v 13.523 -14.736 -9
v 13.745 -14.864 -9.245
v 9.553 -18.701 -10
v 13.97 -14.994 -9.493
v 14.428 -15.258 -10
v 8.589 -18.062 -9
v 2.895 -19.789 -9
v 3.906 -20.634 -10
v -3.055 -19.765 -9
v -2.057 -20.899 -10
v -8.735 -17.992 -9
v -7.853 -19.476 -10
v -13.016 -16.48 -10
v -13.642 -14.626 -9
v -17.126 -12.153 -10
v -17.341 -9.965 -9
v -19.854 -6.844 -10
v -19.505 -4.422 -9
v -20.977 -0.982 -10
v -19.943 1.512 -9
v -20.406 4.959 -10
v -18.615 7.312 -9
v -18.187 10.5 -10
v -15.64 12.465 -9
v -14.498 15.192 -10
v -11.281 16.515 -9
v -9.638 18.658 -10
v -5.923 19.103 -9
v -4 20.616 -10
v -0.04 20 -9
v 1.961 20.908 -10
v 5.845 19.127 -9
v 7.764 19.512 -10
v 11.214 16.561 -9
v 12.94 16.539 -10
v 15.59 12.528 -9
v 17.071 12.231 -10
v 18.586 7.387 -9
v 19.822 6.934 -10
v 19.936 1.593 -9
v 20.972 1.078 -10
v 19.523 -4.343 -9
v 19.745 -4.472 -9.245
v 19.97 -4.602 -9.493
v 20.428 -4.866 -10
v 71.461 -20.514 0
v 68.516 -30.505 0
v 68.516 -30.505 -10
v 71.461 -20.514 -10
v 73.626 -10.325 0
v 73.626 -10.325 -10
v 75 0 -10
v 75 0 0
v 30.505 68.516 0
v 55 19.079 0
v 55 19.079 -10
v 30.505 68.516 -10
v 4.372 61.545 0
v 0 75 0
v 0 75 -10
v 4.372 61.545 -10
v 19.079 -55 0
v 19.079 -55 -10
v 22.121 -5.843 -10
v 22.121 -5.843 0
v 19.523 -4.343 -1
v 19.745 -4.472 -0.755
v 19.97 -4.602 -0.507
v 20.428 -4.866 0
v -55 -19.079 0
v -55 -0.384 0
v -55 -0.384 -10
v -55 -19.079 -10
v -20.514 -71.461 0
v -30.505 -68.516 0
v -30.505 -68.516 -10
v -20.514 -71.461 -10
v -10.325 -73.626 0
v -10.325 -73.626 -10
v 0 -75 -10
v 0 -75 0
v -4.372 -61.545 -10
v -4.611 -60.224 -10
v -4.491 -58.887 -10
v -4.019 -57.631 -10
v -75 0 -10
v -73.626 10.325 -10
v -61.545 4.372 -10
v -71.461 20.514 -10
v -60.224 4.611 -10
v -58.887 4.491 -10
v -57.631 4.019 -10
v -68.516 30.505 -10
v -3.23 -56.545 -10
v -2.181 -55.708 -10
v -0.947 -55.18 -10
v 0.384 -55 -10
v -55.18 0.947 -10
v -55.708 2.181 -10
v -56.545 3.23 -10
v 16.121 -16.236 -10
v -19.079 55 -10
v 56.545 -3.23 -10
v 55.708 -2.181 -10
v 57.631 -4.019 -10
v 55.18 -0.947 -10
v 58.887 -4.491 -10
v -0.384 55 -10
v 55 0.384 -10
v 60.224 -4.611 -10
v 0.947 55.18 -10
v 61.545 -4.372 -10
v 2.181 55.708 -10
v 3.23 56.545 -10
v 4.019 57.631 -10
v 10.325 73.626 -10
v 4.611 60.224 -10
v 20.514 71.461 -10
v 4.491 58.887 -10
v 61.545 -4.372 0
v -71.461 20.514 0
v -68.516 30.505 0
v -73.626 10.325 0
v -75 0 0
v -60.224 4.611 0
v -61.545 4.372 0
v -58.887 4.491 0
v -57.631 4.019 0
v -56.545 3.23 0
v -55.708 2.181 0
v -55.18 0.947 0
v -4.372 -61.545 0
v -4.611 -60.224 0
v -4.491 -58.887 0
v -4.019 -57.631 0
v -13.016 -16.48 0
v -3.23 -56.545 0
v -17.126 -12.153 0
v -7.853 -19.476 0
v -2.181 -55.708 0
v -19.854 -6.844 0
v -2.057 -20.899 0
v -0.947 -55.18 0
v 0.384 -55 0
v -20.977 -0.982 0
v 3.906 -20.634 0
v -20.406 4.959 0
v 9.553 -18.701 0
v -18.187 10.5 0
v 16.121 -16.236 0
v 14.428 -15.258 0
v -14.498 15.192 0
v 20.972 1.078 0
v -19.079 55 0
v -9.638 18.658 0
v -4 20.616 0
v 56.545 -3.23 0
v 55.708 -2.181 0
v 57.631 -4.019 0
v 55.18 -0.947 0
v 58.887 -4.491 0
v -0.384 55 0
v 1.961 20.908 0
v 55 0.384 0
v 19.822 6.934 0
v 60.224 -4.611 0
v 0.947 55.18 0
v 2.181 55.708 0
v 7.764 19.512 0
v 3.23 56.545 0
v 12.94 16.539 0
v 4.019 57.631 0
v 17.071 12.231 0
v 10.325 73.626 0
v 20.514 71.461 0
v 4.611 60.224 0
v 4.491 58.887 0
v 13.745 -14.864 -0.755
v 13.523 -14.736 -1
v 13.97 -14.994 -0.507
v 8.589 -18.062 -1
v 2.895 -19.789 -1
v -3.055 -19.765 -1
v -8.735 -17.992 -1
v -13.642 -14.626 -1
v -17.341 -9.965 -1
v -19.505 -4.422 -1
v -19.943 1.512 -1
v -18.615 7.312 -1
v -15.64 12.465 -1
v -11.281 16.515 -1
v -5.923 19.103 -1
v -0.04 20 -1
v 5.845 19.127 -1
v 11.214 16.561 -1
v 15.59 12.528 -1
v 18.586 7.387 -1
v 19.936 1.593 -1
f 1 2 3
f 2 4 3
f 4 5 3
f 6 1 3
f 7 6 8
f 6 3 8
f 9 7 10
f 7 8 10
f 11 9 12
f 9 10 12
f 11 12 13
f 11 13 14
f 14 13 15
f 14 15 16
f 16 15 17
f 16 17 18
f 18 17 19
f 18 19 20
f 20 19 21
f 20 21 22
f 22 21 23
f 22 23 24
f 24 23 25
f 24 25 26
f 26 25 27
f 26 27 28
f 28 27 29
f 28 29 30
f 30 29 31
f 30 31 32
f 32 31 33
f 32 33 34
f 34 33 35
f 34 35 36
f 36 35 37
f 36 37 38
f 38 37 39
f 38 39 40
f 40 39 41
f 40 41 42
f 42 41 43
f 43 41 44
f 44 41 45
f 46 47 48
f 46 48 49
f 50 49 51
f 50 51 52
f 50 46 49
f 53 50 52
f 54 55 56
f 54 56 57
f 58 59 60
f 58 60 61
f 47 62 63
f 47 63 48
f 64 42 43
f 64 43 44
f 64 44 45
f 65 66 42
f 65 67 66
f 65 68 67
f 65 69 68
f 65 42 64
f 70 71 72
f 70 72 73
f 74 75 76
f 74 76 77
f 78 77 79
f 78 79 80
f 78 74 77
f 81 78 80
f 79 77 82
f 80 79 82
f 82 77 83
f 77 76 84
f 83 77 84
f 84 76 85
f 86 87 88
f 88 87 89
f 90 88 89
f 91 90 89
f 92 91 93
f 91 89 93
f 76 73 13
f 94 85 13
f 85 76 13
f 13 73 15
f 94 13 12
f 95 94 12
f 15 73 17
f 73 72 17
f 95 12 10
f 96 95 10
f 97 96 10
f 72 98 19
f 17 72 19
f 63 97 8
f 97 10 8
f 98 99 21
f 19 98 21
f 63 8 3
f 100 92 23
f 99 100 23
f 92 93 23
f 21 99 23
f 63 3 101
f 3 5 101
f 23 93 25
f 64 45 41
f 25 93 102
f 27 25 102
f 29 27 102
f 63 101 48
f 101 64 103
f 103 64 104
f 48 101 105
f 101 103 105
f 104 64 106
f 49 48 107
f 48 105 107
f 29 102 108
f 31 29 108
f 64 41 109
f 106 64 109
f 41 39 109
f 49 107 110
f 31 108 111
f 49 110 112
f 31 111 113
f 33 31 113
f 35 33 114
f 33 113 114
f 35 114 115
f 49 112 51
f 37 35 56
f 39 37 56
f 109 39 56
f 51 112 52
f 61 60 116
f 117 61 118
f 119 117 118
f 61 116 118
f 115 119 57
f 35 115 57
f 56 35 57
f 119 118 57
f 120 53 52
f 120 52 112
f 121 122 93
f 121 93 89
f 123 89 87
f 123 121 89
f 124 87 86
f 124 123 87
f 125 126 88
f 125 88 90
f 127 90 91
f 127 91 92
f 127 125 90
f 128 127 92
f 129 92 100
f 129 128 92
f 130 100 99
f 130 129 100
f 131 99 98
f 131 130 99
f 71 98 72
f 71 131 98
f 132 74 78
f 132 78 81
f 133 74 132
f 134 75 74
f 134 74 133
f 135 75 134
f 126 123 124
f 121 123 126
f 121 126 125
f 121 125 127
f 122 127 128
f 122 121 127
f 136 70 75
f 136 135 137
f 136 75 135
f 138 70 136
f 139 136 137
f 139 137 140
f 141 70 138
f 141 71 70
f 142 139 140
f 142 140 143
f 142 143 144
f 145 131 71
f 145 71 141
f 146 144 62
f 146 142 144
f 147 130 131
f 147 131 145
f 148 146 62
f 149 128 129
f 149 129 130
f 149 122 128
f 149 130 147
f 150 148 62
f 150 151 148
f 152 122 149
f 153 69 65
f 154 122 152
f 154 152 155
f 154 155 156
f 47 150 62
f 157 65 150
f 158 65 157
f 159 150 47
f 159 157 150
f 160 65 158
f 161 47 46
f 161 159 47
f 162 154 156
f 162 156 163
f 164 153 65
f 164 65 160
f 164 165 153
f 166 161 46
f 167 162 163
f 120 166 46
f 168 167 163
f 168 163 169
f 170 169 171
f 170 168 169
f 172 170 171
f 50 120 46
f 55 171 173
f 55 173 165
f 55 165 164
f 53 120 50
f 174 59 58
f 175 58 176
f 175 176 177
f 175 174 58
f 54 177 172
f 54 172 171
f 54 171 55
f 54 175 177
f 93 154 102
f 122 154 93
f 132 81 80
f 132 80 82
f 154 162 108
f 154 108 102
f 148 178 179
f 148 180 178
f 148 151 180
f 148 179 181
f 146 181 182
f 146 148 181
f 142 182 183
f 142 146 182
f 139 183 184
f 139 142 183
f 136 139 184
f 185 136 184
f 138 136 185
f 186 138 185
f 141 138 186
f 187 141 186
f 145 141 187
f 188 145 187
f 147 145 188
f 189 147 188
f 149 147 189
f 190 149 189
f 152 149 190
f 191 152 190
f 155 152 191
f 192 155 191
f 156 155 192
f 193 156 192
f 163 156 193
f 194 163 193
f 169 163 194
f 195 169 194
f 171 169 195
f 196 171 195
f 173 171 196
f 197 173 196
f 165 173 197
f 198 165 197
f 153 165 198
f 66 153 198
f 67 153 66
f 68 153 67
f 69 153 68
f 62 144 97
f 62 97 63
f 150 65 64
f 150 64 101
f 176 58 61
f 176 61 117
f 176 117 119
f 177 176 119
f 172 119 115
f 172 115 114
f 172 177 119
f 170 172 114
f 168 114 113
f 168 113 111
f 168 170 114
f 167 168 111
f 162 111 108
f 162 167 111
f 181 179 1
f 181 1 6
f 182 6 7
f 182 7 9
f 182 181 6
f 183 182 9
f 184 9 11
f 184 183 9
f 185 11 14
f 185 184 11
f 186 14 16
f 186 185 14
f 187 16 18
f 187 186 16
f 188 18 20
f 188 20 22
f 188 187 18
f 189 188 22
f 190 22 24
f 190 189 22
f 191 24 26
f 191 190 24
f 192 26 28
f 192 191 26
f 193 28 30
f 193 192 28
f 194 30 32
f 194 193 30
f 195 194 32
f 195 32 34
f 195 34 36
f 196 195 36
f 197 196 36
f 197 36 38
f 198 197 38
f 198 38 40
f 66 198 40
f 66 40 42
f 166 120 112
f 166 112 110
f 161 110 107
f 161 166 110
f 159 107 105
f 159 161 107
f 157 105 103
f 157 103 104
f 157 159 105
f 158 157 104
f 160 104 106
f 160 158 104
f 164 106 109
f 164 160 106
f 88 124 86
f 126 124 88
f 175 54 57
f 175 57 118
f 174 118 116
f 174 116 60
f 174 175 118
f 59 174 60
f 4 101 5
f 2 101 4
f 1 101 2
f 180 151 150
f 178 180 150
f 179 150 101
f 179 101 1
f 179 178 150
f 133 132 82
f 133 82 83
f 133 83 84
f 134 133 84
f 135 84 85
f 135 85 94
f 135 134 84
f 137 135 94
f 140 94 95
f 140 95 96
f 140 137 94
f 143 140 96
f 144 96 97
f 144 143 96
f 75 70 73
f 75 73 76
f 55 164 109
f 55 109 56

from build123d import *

# Parameters (mm, degrees)
BOSS_EXTRUDE1_DEPTH = 10
CHAMFER1_SIZE       = 1


with BuildPart() as part:
    # Sketch1 → Boss-Extrude1 (new body)
    with BuildSketch(Plane.XY):
        with BuildLine():
            ThreePointArc((4.371766903777949, 61.5450849718747), (3.661569294176898, 57.06107373853762), (-0.38351567769782763, 55))
            Line((-0.38351567769782763, 55), (-19.078784028338333, 54.99999999999999))
            Line((-19.078784028338333, 55.0000000000002), (-68.51590932319446, 30.505248230686387))
            ThreePointArc((-68.51590932319446, 30.50524823068639), (-72.64180115025157, 15.440491486016093), (-75.00000000000001, 7.8515e-13))
            Line((-75.00000000000001, 7.8558e-13), (-61.545084971874644, 4.371766903778592))
            ThreePointArc((-61.545084971874644, 4.37176690377859), (-57.06107373853757, 3.6615692941774913), (-55, -0.38351567769725153))
            Line((-55.00000000000001, -0.38351567769725153), (-55.000000000000135, -19.078784028338532))
            Line((-55.000000000000135, -19.078784028338532), (-30.50524823068615, -68.51590932319456))
            ThreePointArc((-30.505248230686153, -68.51590932319459), (-15.440491486015834, -72.64180115025164), (-5.2403e-13, -75.00000000000003))
            Line((-5.2372e-13, -75.00000000000001), (-4.371766903778377, -61.54508497187467))
            ThreePointArc((-4.371766903778381, -61.54508497187467), (-3.661569294177295, -57.061073738537594), (0.38351567769744355, -55))
            Line((0.38351567769744355, -55.00000000000001), (19.078784028338724, -55.00000000000007))
            Line((19.078784028338724, -55.00000000000007), (68.51590932319466, -30.50524823068591))
            ThreePointArc((68.51590932319468, -30.505248230685908), (72.64180115025168, -15.440491486015581), (75.00000000000001, -2.6112e-13))
            Line((75.00000000000001, -2.6186e-13), (61.54508497187469, -4.371766903778163))
            ThreePointArc((61.54508497187469, -4.371766903778164), (57.06107373853761, -3.6615692941770925), (55, 0.3835156776976356))
            Line((55.00000000000001, 0.3835156776976356), (55, 19.078784028338916))
            Line((55, 19.078784028338916), (30.50524823068567, 68.51590932319478))
            ThreePointArc((30.50524823068567, 68.51590932319476), (15.440491486015329, 72.64180115025172), (0, 75))
            Line((0, 75.00000000000001), (4.371766903777948, 61.5450849718747))
        make_face()
        with BuildLine():
            Line((16.12078785321155, -16.235544436876165), (13.522711641858239, -14.735544436876154))
            ThreePointArc((13.52271164185824, -14.735544436876154), (-6.000000000000136, -19.078784028338873), (-19.522711641858354, -4.343239591462642))
            ThreePointArc((-19.52271164185835, -4.343239591462641), (-13.522711641858244, 14.735544436876156), (6.000000000000001, 19.078784028338916))
            ThreePointArc((5.999999999999998, 19.078784028338916), (17.320508075688796, 9.999999999999961), (19.522711641858287, -4.3432395914629165))
            Line((19.522711641858287, -4.343239591462916), (22.1207878532116, -5.843239591462927))
            Line((22.1207878532116, -5.843239591462927), (16.12078785321155, -16.235544436876165))
        make_face(mode=Mode.SUBTRACT)
    extrude(amount=-BOSS_EXTRUDE1_DEPTH)

    # Chamfer1
    chamfer1_edges = [part.edges().sort_by_distance(p)[0] for p in [
        (-19.522711641858322, -4.343239591462766, 0),
        (-19.522711641858322, -4.343239591462773, -10),
    ]]
    chamfer(chamfer1_edges, length=CHAMFER1_SIZE)


solid = part.part
